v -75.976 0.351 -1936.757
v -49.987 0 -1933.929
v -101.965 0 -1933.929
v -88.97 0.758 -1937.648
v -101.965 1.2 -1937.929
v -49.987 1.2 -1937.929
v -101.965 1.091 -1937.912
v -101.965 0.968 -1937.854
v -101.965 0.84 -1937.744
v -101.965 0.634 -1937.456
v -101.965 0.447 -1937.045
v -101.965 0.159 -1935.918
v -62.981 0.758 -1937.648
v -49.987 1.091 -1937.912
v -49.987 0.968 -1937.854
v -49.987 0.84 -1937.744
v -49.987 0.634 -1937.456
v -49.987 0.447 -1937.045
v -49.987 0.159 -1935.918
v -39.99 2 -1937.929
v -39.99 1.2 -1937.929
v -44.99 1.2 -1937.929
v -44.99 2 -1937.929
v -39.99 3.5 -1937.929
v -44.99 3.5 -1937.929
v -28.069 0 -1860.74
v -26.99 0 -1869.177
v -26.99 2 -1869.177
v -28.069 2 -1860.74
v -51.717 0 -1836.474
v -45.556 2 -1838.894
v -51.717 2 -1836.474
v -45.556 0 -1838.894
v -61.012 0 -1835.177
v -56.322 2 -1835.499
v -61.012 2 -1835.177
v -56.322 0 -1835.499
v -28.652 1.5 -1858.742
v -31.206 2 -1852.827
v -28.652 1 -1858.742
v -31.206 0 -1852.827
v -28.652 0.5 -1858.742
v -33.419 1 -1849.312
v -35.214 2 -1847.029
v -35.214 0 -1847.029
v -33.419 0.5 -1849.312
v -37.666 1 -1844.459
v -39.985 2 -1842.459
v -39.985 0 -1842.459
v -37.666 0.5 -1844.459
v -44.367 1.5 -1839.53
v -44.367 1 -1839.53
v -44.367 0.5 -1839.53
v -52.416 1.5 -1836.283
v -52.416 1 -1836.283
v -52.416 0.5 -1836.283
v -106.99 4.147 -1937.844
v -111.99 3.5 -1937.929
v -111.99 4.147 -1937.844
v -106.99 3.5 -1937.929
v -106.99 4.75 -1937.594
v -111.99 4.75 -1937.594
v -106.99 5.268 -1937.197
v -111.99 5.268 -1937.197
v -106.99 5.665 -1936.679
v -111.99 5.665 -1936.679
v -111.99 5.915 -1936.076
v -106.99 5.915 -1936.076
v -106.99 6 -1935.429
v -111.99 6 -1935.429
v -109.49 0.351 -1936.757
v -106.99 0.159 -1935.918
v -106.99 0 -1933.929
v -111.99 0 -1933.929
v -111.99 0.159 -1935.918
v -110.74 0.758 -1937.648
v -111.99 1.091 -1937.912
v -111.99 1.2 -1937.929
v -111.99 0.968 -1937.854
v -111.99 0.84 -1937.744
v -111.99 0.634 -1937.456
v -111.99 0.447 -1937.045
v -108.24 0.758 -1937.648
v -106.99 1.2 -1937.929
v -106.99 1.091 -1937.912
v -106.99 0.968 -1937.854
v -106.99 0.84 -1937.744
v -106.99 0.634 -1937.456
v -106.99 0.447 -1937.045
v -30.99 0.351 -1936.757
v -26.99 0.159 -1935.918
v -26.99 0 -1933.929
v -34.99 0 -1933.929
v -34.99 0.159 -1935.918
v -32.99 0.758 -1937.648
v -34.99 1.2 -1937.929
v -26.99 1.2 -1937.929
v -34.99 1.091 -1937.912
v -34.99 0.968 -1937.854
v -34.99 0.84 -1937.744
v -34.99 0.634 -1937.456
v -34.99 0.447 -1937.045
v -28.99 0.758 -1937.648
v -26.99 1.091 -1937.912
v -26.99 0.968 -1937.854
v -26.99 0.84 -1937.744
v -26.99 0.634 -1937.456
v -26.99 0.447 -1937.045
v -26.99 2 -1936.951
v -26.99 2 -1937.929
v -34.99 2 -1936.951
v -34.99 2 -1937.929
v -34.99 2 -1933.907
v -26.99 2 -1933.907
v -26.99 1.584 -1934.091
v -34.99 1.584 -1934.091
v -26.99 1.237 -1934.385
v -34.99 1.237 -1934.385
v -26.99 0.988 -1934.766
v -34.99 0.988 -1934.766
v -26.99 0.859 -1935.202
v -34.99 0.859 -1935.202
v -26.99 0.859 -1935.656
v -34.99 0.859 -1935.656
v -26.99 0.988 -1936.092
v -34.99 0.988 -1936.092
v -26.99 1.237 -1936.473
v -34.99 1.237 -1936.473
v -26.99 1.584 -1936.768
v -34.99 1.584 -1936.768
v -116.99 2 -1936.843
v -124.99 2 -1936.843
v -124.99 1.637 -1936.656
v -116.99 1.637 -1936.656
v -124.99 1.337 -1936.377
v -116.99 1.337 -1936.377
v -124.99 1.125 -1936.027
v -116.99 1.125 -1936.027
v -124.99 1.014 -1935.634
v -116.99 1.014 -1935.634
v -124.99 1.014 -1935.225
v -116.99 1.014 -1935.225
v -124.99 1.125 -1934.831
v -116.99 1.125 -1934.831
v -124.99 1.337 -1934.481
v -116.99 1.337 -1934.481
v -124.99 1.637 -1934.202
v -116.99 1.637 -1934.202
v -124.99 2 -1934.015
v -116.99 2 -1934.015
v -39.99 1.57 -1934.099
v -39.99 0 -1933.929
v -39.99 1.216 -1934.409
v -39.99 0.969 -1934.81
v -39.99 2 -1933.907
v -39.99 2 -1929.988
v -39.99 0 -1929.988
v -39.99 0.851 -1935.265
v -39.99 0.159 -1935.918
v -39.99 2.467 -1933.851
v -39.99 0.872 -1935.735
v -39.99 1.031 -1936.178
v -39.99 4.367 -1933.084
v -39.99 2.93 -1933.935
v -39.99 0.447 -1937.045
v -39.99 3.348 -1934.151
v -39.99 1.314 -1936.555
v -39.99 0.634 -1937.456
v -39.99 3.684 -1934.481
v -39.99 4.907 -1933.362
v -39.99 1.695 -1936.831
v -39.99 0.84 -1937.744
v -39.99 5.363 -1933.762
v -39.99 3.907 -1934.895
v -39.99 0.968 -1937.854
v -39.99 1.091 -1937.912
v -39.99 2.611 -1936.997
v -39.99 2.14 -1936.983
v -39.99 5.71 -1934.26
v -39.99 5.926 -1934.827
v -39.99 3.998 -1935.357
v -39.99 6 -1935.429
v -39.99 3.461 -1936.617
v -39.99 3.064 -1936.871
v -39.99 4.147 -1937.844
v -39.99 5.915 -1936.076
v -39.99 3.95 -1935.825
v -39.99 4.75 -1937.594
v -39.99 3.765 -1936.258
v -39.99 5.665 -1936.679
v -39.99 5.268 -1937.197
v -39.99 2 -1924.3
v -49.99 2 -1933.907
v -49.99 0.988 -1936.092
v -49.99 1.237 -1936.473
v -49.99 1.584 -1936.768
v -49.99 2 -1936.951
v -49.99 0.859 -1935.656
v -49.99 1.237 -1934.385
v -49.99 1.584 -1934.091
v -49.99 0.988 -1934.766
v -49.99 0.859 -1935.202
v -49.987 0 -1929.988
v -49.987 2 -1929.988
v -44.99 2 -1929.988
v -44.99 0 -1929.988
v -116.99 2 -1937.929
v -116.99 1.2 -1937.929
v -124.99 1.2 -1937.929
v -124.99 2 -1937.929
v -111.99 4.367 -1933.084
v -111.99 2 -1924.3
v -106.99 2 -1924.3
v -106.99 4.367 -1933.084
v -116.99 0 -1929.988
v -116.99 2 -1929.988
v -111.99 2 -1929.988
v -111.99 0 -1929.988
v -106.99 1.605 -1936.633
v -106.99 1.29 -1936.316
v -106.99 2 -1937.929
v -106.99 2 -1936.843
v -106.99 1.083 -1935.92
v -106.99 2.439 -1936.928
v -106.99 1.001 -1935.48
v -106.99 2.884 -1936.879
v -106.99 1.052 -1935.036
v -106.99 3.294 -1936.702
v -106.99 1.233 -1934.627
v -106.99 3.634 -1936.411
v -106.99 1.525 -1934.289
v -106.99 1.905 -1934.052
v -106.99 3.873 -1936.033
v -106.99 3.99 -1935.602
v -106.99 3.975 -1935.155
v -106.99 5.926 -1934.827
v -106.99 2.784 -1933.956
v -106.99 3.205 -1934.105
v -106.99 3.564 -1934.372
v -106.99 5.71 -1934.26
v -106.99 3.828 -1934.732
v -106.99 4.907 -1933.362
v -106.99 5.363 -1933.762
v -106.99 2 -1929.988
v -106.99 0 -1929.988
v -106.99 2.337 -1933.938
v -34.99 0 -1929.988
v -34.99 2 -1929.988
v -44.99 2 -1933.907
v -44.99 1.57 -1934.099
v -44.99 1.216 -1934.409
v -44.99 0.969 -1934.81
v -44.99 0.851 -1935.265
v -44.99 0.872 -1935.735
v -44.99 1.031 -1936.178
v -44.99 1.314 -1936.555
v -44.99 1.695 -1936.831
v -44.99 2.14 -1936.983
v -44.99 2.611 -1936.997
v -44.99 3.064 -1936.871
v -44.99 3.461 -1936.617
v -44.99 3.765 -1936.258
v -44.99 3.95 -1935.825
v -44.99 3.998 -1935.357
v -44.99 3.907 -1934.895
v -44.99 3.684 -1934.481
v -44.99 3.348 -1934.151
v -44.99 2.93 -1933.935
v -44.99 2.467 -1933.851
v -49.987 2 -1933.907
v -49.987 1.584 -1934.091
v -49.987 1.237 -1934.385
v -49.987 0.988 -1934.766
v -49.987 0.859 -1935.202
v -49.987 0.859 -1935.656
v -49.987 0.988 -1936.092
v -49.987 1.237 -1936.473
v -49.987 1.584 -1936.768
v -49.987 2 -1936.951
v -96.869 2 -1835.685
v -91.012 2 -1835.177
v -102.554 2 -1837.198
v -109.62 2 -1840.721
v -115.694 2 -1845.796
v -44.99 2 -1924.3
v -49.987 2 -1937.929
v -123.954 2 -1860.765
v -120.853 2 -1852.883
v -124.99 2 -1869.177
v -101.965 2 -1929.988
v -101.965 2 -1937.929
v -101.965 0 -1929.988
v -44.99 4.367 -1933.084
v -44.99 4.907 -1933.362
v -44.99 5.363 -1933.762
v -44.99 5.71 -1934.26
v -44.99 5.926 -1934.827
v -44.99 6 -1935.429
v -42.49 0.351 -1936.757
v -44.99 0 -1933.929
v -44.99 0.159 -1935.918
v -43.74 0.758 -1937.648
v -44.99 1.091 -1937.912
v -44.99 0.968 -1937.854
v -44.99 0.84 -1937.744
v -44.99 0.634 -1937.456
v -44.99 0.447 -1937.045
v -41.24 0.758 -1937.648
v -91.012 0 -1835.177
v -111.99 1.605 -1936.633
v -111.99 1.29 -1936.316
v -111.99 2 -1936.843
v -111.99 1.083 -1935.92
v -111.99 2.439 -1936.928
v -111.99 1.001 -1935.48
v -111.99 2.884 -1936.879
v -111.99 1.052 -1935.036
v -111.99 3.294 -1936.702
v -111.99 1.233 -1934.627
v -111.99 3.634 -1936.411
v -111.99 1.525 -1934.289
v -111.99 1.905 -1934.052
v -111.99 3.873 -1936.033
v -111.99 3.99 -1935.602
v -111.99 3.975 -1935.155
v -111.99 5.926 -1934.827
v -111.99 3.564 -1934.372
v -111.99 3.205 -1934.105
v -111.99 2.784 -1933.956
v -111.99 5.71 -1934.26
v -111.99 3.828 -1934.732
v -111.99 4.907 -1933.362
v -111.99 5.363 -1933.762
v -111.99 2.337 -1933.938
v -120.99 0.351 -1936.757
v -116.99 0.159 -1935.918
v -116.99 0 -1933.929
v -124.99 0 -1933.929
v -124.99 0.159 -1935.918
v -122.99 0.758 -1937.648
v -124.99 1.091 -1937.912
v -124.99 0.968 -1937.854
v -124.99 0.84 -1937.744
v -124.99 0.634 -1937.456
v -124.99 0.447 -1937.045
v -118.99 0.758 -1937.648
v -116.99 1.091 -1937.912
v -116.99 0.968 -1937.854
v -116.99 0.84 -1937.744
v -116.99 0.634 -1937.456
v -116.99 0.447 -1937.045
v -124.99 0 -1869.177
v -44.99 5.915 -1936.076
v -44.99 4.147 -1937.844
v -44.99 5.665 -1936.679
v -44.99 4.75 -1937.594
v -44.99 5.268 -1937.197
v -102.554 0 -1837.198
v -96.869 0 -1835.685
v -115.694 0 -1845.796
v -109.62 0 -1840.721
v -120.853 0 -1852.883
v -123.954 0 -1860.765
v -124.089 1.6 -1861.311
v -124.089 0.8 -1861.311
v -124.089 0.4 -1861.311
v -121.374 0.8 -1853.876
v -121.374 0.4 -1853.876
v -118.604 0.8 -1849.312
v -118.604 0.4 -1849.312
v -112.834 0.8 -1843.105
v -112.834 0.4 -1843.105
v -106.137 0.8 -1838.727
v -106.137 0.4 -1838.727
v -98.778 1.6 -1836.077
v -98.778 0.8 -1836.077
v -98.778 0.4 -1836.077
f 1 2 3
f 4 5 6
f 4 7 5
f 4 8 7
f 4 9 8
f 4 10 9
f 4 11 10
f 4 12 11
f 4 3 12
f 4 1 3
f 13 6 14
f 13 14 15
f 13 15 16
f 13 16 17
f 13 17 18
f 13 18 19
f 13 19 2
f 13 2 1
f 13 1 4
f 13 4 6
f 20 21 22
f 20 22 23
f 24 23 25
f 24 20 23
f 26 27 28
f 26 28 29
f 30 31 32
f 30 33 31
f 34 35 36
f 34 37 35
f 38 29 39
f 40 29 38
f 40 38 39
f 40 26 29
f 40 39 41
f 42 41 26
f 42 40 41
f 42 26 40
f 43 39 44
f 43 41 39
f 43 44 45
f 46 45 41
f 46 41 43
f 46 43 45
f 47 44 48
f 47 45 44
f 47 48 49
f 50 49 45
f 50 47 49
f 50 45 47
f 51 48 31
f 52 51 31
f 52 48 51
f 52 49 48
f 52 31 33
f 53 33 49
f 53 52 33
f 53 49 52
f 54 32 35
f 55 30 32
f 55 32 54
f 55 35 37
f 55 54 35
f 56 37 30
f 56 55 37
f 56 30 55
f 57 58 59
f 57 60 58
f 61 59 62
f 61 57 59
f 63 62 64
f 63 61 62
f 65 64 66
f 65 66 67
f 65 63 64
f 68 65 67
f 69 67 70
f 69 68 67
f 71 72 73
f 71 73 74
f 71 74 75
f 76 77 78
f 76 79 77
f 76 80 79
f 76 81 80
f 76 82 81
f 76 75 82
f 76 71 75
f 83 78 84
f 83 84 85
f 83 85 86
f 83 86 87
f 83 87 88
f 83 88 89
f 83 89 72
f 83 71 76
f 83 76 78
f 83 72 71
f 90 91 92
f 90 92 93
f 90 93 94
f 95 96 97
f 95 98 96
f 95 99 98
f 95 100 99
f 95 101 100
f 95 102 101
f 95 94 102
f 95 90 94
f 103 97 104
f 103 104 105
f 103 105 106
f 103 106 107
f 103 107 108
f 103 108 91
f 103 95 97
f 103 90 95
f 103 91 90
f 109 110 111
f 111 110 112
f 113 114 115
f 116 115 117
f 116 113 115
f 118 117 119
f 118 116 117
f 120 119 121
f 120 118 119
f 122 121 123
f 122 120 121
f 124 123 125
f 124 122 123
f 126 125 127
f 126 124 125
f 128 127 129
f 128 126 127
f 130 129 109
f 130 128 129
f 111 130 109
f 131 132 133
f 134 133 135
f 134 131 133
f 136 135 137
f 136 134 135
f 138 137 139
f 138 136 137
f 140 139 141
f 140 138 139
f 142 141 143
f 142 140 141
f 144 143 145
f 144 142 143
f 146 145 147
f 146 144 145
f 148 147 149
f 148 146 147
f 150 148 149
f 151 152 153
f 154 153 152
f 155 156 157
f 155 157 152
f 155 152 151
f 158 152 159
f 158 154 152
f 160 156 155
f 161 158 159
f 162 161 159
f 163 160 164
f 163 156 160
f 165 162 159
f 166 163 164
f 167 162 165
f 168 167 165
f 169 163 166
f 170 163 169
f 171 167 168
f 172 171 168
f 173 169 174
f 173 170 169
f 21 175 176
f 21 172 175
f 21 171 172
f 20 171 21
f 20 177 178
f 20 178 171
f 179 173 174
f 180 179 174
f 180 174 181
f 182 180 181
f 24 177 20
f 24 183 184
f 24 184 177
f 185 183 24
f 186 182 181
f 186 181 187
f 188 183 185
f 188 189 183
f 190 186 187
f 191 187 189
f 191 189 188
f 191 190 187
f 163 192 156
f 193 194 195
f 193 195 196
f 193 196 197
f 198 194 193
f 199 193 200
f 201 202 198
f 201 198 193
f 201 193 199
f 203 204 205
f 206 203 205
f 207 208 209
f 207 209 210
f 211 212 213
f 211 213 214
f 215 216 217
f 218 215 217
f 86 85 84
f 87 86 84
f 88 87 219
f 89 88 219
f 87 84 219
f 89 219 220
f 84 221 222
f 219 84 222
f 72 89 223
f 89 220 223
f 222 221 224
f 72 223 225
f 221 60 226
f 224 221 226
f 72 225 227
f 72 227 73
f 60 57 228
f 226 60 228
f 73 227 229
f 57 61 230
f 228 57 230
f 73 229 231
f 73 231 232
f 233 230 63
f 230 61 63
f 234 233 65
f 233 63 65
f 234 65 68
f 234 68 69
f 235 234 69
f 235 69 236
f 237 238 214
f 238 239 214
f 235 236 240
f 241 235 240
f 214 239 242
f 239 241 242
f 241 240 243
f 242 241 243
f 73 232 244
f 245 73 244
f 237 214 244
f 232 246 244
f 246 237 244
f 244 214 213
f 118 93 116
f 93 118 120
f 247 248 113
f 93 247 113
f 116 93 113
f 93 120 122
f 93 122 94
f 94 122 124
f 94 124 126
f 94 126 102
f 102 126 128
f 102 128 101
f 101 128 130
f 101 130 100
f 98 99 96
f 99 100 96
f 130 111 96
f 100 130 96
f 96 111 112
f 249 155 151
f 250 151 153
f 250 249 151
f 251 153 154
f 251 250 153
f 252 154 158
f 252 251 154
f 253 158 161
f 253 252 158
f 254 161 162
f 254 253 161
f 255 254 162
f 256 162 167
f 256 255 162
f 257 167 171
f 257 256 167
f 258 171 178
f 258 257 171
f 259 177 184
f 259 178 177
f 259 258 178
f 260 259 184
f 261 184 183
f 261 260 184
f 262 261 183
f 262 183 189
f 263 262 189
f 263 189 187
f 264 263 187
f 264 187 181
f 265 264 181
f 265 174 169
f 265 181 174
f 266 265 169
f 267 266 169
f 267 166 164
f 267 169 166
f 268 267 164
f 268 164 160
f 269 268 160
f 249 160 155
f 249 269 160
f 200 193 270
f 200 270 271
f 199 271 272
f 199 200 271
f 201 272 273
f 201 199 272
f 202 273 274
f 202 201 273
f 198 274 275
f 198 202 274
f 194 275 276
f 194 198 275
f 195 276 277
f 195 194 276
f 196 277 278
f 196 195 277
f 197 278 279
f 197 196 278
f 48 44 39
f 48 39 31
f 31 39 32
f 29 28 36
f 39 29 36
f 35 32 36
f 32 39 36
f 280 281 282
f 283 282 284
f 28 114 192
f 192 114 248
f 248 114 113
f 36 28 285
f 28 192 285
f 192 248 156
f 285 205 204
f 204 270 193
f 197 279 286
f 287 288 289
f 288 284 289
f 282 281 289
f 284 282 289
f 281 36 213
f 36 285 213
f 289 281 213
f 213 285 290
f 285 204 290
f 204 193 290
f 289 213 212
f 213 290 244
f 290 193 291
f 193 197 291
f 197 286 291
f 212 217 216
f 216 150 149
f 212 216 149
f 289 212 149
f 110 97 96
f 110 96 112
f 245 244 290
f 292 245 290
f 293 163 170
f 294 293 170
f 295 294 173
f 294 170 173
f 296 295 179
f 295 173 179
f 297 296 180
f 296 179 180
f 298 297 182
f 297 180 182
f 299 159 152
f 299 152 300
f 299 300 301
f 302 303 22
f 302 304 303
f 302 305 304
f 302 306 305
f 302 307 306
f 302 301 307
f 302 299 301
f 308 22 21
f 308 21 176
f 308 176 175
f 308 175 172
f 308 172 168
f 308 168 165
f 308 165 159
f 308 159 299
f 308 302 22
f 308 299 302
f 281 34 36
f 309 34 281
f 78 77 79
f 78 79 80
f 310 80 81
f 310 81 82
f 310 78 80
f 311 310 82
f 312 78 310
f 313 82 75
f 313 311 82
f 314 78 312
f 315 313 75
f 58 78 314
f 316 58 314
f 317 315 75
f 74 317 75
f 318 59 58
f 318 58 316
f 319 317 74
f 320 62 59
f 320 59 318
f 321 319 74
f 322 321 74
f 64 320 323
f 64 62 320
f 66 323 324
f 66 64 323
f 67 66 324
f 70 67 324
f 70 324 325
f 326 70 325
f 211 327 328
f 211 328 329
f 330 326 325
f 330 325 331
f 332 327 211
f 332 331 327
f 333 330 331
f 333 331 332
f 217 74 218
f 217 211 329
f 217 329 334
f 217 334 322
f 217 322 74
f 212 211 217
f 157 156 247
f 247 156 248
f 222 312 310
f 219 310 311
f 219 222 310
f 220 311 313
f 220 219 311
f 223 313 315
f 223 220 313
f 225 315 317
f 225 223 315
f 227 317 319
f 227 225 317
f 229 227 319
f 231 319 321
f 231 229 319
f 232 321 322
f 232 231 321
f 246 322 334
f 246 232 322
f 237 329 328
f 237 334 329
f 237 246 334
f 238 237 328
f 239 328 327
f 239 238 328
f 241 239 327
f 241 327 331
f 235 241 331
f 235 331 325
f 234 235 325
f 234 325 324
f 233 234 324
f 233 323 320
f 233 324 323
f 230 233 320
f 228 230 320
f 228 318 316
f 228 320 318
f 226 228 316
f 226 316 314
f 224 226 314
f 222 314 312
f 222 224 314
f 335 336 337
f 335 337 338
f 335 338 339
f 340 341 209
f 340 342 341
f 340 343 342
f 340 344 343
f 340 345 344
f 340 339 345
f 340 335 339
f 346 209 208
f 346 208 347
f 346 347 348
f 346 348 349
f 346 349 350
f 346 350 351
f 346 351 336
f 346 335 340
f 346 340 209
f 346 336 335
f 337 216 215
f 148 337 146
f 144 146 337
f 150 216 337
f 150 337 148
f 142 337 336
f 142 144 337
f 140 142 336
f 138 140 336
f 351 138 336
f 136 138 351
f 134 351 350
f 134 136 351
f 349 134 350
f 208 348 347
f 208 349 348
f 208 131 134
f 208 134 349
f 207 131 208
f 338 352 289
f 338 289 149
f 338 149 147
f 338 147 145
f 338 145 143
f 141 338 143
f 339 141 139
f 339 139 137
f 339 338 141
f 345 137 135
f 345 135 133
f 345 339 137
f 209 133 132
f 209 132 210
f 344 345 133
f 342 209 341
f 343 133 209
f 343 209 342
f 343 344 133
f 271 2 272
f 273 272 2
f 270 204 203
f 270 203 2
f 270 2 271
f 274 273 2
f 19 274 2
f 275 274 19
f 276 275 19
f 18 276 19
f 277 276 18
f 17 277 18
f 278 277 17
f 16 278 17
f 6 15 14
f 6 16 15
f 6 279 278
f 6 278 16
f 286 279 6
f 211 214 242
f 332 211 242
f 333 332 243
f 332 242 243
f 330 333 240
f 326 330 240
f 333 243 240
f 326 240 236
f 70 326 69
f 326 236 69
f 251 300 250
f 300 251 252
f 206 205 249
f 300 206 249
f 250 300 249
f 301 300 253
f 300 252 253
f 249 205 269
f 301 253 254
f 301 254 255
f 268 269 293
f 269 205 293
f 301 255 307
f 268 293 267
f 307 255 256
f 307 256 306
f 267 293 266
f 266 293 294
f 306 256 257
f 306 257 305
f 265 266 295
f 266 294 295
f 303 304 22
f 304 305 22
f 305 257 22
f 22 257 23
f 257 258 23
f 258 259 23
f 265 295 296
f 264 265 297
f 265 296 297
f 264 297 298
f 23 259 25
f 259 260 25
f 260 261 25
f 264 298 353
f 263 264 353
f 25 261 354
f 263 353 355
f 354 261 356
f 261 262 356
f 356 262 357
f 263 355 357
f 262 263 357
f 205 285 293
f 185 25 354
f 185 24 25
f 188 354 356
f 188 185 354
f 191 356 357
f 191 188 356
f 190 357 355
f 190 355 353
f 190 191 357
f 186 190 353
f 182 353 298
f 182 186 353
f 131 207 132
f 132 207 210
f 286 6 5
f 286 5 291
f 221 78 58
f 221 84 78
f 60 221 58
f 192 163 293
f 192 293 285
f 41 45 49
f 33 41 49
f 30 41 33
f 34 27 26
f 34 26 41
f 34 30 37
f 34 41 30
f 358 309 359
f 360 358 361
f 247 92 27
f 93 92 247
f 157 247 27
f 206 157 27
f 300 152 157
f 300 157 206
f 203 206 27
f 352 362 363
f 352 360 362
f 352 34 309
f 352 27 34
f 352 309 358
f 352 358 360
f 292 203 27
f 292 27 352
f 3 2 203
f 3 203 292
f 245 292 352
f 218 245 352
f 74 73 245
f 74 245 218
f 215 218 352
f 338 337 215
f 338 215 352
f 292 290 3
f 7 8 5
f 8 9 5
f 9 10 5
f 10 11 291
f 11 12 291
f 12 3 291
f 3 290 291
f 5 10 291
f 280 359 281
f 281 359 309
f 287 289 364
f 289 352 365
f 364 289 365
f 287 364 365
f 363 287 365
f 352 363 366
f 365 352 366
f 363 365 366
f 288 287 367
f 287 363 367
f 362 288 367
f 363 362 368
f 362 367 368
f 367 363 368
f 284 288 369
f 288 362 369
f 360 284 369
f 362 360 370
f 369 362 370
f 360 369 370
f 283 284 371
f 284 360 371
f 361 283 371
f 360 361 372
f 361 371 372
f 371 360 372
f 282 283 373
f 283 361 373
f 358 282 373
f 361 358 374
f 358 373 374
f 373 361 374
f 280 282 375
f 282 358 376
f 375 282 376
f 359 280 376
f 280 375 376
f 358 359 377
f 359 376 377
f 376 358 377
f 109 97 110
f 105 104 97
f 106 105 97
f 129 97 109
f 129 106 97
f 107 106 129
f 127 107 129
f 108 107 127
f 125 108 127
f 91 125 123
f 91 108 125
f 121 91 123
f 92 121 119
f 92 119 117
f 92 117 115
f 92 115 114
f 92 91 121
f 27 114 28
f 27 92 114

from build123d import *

# Parameters (mm, degrees)
BOSS_EXTRUDE1_DEPTH     = 2
SKETCH5_W               = 4
SKETCH5_H               = 2
CUT_EXTRUDE3_DEPTH      = 123
FILLET3_SIZE            = 4
FILLET3_SIZE_2          = 1.2
SKETCH6_W               = 5
SKETCH6_H               = 5
BOSS_EXTRUDE3_DEPTH     = 4
FILLET4_R               = 2.5
CUT_EXTRUDE7_DEPTH      = 23
CUT_EXTRUDE7_DEPTH_BACK = 10
SKETCH7_R               = 1.5
CUT_EXTRUDE8_DEPTH      = 103
CUT_EXTRUDE8_DEPTH_BACK = 10
SKETCH8_R               = 1.578894268
SKETCH11_W              = 5
SKETCH11_H              = 7.941397329
SKETCH11_W_2            = 5.025588604
SKETCH11_W_3            = 4.996681142
SKETCH11_W_4            = 5.000407309
CUT_EXTRUDE10_DEPTH     = 2
BOSS_EXTRUDE9_DEPTH     = 5
BOSS_EXTRUDE10_DEPTH    = 5


# Some blends are built 0.0001 mm under size
with BuildPart() as part:
    # Sketch1 → Boss-Extrude1 (new body)
    with BuildSketch(Plane(origin=(0, 0, 0), x_dir=(1, 0, 0), z_dir=(0, 1, 0))):
        with BuildLine():
            Line((-124.990139359, 1941.929047201), (-26.990139359, 1941.929047201))
            Line((-26.990139359, 1941.929047201), (-26.990139359, 1869.177480284))
            add(Edge.make_bspline(
                [(-26.990139359, 1869.177480284), (-26.971518988, 1862.10424426), (-30.008687271, 1852.889636427), (-37.937395583, 1843.840603399), (-46.643299948, 1837.427446423), (-55.223933615, 1835.160216105), (-61.011506847, 1835.177480284)],
                knots=[0, 0, 0, 0, 0.39690732, 0.518030206, 0.674278755, 1, 1, 1, 1], degree=3))
            Line((-61.011506847, 1835.177480284), (-91.011506847, 1835.177480284))
            add(Edge.make_bspline(
                [(-124.990139359, 1869.177480284), (-125.031653114, 1863.882416947), (-123.319081347, 1856.812557982), (-118.175654079, 1848.334494738), (-113.169582942, 1842.947577461), (-104.127691798, 1837.037384536), (-96.235416895, 1835.16563891), (-91.011506847, 1835.177480284)],
                knots=[0, 0, 0, 0, 0.297124953, 0.397302783, 0.556358073, 0.706503021, 1, 1, 1, 1], degree=3))
            Line((-124.990139359, 1869.177480284), (-124.990139359, 1941.929047201))
        make_face()
    extrude(amount=BOSS_EXTRUDE1_DEPTH)

    # Sketch5 → Cut-Extrude3 (cut)
    with BuildSketch(Plane(origin=(-26.990139359, 0, 0), x_dir=(0, 0, -1), z_dir=(1, 0, 0))):
        with Locations((1939.929047201, 1)):
            Rectangle(SKETCH5_W, SKETCH5_H)
    extrude(amount=-CUT_EXTRUDE3_DEPTH, mode=Mode.SUBTRACT)

    # Fillet3
    # an asymmetric fillet: 4, 1.2 mm, written as the material it takes off along each edge
    with BuildSketch(Plane(origin=(-16.990139359, 0, -1937.929047201), x_dir=(0, 0, 1), z_dir=(-1, 0, 0))) as fillet3_piece_1:
        with BuildLine():
            Bezier((FILLET3_SIZE, 0), (0, 0), (0, FILLET3_SIZE_2), weights=[1, 0.707106781, 1])
            Line((0, FILLET3_SIZE_2), (0, 0))
            Line((0, 0), (FILLET3_SIZE, 0))
        make_face()
    extrude(amount=118, mode=Mode.SUBTRACT)

    # Sketch6 → Boss-Extrude3 (add)
    with BuildSketch(Plane(origin=(0, 2, 0), x_dir=(1, 0, 0), z_dir=(0, 1, 0))):
        with Locations((-42.490139359, 1935.429047201)):
            Rectangle(SKETCH6_W, SKETCH6_H)
        with Locations((-109.490139359, 1935.429047201)):
            Rectangle(SKETCH6_W, SKETCH6_H)
    extrude(amount=BOSS_EXTRUDE3_DEPTH)

    # Fillet4
    fillet4_edges = [part.edges().sort_by_distance(p)[0] for p in [
        (-42.490139359, 6, -1932.929047201),
        (-42.490139359, 6, -1937.929047201),
        (-109.490139359, 6, -1932.929047201),
        (-109.490139359, 6, -1937.929047201),
    ]]
    fillet(fillet4_edges, radius=FILLET4_R - 0.0001)  # a hair under: the kernel refuses the full size

    # Sketch7 → Cut-Extrude7 (cut, two sides: drawn at the far end of the back side and taken through both)
    with BuildSketch(Plane.ZY.offset(111.990139359).offset(-CUT_EXTRUDE7_DEPTH_BACK)):
        with Locations(Location((-1935.429047201, 2.500019457, 0), (0, 0, 199.472008932))):
            Circle(SKETCH7_R)
    extrude(amount=CUT_EXTRUDE7_DEPTH + CUT_EXTRUDE7_DEPTH_BACK, mode=Mode.SUBTRACT)

    # Sketch8 → Cut-Extrude8 (cut, two sides: drawn at the far end of the back side and taken through both)
    with BuildSketch(Plane(origin=(-39.990139359, 0, 0), x_dir=(0, 0, -1), z_dir=(1, 0, 0)).offset(-CUT_EXTRUDE8_DEPTH_BACK)):
        with Locations(Location((1935.429047201, 2.421125189, 0), (0, 0, 195.469275058))):
            Circle(SKETCH8_R)
    extrude(amount=CUT_EXTRUDE8_DEPTH + CUT_EXTRUDE8_DEPTH_BACK, mode=Mode.SUBTRACT)

    # Sketch11 → Cut-Extrude10 (cut)
    with BuildSketch(Plane(origin=(0, 2, 0), x_dir=(1, 0, 0), z_dir=(0, 1, 0))):
        with Locations((-114.490139359, 1933.958348537)):
            Rectangle(SKETCH11_W, SKETCH11_H)
        with Locations((-104.477345057, 1933.958348537)):
            Rectangle(SKETCH11_W_2, SKETCH11_H)
        with Locations((-47.48847993, 1933.958348537)):
            Rectangle(SKETCH11_W_3, SKETCH11_H)
        with Locations((-37.489935704, 1933.958348537)):
            Rectangle(SKETCH11_W_4, SKETCH11_H)
    extrude(amount=-CUT_EXTRUDE10_DEPTH, mode=Mode.SUBTRACT)

    # Sketch12 → Boss-Extrude9 (add)
    with BuildSketch(Plane.ZY.offset(111.990139359)):
        with BuildLine():
            Line((-1924.299895593, 2), (-1934.170448036, 4.660075958))
            add(Edge.make_bspline(
                [(-1934.170448036, 4.660075958), (-1933.941696195, 4.343587233), (-1933.419980381, 3.982722954), (-1933.044506849, 2.985103355), (-1932.921466188, 2.346520539), (-1933.020256273, 1.890017898)],
                knots=[0, 0, 0, 0, 0.374528061, 0.57386245, 1, 1, 1, 1], degree=3))
            Line((-1933.020256273, 1.890017898), (-1924.299895593, 2))
        make_face()
    extrude(amount=-BOSS_EXTRUDE9_DEPTH)

    # Sketch13 → Boss-Extrude10 (add)
    with BuildSketch(Plane(origin=(-39.990139359, 0, 0), x_dir=(0, 0, -1), z_dir=(1, 0, 0))):
        Polygon((1933.084337522, 4.367373347), (1924.299895593, 2), (1933.057886548, 2), (1933.341968005, 3.330037979), (1934.06795395, 4.267766953), (1934.612443409, 4.7319029), align=None)
    extrude(amount=-BOSS_EXTRUDE10_DEPTH)


solid = part.part
